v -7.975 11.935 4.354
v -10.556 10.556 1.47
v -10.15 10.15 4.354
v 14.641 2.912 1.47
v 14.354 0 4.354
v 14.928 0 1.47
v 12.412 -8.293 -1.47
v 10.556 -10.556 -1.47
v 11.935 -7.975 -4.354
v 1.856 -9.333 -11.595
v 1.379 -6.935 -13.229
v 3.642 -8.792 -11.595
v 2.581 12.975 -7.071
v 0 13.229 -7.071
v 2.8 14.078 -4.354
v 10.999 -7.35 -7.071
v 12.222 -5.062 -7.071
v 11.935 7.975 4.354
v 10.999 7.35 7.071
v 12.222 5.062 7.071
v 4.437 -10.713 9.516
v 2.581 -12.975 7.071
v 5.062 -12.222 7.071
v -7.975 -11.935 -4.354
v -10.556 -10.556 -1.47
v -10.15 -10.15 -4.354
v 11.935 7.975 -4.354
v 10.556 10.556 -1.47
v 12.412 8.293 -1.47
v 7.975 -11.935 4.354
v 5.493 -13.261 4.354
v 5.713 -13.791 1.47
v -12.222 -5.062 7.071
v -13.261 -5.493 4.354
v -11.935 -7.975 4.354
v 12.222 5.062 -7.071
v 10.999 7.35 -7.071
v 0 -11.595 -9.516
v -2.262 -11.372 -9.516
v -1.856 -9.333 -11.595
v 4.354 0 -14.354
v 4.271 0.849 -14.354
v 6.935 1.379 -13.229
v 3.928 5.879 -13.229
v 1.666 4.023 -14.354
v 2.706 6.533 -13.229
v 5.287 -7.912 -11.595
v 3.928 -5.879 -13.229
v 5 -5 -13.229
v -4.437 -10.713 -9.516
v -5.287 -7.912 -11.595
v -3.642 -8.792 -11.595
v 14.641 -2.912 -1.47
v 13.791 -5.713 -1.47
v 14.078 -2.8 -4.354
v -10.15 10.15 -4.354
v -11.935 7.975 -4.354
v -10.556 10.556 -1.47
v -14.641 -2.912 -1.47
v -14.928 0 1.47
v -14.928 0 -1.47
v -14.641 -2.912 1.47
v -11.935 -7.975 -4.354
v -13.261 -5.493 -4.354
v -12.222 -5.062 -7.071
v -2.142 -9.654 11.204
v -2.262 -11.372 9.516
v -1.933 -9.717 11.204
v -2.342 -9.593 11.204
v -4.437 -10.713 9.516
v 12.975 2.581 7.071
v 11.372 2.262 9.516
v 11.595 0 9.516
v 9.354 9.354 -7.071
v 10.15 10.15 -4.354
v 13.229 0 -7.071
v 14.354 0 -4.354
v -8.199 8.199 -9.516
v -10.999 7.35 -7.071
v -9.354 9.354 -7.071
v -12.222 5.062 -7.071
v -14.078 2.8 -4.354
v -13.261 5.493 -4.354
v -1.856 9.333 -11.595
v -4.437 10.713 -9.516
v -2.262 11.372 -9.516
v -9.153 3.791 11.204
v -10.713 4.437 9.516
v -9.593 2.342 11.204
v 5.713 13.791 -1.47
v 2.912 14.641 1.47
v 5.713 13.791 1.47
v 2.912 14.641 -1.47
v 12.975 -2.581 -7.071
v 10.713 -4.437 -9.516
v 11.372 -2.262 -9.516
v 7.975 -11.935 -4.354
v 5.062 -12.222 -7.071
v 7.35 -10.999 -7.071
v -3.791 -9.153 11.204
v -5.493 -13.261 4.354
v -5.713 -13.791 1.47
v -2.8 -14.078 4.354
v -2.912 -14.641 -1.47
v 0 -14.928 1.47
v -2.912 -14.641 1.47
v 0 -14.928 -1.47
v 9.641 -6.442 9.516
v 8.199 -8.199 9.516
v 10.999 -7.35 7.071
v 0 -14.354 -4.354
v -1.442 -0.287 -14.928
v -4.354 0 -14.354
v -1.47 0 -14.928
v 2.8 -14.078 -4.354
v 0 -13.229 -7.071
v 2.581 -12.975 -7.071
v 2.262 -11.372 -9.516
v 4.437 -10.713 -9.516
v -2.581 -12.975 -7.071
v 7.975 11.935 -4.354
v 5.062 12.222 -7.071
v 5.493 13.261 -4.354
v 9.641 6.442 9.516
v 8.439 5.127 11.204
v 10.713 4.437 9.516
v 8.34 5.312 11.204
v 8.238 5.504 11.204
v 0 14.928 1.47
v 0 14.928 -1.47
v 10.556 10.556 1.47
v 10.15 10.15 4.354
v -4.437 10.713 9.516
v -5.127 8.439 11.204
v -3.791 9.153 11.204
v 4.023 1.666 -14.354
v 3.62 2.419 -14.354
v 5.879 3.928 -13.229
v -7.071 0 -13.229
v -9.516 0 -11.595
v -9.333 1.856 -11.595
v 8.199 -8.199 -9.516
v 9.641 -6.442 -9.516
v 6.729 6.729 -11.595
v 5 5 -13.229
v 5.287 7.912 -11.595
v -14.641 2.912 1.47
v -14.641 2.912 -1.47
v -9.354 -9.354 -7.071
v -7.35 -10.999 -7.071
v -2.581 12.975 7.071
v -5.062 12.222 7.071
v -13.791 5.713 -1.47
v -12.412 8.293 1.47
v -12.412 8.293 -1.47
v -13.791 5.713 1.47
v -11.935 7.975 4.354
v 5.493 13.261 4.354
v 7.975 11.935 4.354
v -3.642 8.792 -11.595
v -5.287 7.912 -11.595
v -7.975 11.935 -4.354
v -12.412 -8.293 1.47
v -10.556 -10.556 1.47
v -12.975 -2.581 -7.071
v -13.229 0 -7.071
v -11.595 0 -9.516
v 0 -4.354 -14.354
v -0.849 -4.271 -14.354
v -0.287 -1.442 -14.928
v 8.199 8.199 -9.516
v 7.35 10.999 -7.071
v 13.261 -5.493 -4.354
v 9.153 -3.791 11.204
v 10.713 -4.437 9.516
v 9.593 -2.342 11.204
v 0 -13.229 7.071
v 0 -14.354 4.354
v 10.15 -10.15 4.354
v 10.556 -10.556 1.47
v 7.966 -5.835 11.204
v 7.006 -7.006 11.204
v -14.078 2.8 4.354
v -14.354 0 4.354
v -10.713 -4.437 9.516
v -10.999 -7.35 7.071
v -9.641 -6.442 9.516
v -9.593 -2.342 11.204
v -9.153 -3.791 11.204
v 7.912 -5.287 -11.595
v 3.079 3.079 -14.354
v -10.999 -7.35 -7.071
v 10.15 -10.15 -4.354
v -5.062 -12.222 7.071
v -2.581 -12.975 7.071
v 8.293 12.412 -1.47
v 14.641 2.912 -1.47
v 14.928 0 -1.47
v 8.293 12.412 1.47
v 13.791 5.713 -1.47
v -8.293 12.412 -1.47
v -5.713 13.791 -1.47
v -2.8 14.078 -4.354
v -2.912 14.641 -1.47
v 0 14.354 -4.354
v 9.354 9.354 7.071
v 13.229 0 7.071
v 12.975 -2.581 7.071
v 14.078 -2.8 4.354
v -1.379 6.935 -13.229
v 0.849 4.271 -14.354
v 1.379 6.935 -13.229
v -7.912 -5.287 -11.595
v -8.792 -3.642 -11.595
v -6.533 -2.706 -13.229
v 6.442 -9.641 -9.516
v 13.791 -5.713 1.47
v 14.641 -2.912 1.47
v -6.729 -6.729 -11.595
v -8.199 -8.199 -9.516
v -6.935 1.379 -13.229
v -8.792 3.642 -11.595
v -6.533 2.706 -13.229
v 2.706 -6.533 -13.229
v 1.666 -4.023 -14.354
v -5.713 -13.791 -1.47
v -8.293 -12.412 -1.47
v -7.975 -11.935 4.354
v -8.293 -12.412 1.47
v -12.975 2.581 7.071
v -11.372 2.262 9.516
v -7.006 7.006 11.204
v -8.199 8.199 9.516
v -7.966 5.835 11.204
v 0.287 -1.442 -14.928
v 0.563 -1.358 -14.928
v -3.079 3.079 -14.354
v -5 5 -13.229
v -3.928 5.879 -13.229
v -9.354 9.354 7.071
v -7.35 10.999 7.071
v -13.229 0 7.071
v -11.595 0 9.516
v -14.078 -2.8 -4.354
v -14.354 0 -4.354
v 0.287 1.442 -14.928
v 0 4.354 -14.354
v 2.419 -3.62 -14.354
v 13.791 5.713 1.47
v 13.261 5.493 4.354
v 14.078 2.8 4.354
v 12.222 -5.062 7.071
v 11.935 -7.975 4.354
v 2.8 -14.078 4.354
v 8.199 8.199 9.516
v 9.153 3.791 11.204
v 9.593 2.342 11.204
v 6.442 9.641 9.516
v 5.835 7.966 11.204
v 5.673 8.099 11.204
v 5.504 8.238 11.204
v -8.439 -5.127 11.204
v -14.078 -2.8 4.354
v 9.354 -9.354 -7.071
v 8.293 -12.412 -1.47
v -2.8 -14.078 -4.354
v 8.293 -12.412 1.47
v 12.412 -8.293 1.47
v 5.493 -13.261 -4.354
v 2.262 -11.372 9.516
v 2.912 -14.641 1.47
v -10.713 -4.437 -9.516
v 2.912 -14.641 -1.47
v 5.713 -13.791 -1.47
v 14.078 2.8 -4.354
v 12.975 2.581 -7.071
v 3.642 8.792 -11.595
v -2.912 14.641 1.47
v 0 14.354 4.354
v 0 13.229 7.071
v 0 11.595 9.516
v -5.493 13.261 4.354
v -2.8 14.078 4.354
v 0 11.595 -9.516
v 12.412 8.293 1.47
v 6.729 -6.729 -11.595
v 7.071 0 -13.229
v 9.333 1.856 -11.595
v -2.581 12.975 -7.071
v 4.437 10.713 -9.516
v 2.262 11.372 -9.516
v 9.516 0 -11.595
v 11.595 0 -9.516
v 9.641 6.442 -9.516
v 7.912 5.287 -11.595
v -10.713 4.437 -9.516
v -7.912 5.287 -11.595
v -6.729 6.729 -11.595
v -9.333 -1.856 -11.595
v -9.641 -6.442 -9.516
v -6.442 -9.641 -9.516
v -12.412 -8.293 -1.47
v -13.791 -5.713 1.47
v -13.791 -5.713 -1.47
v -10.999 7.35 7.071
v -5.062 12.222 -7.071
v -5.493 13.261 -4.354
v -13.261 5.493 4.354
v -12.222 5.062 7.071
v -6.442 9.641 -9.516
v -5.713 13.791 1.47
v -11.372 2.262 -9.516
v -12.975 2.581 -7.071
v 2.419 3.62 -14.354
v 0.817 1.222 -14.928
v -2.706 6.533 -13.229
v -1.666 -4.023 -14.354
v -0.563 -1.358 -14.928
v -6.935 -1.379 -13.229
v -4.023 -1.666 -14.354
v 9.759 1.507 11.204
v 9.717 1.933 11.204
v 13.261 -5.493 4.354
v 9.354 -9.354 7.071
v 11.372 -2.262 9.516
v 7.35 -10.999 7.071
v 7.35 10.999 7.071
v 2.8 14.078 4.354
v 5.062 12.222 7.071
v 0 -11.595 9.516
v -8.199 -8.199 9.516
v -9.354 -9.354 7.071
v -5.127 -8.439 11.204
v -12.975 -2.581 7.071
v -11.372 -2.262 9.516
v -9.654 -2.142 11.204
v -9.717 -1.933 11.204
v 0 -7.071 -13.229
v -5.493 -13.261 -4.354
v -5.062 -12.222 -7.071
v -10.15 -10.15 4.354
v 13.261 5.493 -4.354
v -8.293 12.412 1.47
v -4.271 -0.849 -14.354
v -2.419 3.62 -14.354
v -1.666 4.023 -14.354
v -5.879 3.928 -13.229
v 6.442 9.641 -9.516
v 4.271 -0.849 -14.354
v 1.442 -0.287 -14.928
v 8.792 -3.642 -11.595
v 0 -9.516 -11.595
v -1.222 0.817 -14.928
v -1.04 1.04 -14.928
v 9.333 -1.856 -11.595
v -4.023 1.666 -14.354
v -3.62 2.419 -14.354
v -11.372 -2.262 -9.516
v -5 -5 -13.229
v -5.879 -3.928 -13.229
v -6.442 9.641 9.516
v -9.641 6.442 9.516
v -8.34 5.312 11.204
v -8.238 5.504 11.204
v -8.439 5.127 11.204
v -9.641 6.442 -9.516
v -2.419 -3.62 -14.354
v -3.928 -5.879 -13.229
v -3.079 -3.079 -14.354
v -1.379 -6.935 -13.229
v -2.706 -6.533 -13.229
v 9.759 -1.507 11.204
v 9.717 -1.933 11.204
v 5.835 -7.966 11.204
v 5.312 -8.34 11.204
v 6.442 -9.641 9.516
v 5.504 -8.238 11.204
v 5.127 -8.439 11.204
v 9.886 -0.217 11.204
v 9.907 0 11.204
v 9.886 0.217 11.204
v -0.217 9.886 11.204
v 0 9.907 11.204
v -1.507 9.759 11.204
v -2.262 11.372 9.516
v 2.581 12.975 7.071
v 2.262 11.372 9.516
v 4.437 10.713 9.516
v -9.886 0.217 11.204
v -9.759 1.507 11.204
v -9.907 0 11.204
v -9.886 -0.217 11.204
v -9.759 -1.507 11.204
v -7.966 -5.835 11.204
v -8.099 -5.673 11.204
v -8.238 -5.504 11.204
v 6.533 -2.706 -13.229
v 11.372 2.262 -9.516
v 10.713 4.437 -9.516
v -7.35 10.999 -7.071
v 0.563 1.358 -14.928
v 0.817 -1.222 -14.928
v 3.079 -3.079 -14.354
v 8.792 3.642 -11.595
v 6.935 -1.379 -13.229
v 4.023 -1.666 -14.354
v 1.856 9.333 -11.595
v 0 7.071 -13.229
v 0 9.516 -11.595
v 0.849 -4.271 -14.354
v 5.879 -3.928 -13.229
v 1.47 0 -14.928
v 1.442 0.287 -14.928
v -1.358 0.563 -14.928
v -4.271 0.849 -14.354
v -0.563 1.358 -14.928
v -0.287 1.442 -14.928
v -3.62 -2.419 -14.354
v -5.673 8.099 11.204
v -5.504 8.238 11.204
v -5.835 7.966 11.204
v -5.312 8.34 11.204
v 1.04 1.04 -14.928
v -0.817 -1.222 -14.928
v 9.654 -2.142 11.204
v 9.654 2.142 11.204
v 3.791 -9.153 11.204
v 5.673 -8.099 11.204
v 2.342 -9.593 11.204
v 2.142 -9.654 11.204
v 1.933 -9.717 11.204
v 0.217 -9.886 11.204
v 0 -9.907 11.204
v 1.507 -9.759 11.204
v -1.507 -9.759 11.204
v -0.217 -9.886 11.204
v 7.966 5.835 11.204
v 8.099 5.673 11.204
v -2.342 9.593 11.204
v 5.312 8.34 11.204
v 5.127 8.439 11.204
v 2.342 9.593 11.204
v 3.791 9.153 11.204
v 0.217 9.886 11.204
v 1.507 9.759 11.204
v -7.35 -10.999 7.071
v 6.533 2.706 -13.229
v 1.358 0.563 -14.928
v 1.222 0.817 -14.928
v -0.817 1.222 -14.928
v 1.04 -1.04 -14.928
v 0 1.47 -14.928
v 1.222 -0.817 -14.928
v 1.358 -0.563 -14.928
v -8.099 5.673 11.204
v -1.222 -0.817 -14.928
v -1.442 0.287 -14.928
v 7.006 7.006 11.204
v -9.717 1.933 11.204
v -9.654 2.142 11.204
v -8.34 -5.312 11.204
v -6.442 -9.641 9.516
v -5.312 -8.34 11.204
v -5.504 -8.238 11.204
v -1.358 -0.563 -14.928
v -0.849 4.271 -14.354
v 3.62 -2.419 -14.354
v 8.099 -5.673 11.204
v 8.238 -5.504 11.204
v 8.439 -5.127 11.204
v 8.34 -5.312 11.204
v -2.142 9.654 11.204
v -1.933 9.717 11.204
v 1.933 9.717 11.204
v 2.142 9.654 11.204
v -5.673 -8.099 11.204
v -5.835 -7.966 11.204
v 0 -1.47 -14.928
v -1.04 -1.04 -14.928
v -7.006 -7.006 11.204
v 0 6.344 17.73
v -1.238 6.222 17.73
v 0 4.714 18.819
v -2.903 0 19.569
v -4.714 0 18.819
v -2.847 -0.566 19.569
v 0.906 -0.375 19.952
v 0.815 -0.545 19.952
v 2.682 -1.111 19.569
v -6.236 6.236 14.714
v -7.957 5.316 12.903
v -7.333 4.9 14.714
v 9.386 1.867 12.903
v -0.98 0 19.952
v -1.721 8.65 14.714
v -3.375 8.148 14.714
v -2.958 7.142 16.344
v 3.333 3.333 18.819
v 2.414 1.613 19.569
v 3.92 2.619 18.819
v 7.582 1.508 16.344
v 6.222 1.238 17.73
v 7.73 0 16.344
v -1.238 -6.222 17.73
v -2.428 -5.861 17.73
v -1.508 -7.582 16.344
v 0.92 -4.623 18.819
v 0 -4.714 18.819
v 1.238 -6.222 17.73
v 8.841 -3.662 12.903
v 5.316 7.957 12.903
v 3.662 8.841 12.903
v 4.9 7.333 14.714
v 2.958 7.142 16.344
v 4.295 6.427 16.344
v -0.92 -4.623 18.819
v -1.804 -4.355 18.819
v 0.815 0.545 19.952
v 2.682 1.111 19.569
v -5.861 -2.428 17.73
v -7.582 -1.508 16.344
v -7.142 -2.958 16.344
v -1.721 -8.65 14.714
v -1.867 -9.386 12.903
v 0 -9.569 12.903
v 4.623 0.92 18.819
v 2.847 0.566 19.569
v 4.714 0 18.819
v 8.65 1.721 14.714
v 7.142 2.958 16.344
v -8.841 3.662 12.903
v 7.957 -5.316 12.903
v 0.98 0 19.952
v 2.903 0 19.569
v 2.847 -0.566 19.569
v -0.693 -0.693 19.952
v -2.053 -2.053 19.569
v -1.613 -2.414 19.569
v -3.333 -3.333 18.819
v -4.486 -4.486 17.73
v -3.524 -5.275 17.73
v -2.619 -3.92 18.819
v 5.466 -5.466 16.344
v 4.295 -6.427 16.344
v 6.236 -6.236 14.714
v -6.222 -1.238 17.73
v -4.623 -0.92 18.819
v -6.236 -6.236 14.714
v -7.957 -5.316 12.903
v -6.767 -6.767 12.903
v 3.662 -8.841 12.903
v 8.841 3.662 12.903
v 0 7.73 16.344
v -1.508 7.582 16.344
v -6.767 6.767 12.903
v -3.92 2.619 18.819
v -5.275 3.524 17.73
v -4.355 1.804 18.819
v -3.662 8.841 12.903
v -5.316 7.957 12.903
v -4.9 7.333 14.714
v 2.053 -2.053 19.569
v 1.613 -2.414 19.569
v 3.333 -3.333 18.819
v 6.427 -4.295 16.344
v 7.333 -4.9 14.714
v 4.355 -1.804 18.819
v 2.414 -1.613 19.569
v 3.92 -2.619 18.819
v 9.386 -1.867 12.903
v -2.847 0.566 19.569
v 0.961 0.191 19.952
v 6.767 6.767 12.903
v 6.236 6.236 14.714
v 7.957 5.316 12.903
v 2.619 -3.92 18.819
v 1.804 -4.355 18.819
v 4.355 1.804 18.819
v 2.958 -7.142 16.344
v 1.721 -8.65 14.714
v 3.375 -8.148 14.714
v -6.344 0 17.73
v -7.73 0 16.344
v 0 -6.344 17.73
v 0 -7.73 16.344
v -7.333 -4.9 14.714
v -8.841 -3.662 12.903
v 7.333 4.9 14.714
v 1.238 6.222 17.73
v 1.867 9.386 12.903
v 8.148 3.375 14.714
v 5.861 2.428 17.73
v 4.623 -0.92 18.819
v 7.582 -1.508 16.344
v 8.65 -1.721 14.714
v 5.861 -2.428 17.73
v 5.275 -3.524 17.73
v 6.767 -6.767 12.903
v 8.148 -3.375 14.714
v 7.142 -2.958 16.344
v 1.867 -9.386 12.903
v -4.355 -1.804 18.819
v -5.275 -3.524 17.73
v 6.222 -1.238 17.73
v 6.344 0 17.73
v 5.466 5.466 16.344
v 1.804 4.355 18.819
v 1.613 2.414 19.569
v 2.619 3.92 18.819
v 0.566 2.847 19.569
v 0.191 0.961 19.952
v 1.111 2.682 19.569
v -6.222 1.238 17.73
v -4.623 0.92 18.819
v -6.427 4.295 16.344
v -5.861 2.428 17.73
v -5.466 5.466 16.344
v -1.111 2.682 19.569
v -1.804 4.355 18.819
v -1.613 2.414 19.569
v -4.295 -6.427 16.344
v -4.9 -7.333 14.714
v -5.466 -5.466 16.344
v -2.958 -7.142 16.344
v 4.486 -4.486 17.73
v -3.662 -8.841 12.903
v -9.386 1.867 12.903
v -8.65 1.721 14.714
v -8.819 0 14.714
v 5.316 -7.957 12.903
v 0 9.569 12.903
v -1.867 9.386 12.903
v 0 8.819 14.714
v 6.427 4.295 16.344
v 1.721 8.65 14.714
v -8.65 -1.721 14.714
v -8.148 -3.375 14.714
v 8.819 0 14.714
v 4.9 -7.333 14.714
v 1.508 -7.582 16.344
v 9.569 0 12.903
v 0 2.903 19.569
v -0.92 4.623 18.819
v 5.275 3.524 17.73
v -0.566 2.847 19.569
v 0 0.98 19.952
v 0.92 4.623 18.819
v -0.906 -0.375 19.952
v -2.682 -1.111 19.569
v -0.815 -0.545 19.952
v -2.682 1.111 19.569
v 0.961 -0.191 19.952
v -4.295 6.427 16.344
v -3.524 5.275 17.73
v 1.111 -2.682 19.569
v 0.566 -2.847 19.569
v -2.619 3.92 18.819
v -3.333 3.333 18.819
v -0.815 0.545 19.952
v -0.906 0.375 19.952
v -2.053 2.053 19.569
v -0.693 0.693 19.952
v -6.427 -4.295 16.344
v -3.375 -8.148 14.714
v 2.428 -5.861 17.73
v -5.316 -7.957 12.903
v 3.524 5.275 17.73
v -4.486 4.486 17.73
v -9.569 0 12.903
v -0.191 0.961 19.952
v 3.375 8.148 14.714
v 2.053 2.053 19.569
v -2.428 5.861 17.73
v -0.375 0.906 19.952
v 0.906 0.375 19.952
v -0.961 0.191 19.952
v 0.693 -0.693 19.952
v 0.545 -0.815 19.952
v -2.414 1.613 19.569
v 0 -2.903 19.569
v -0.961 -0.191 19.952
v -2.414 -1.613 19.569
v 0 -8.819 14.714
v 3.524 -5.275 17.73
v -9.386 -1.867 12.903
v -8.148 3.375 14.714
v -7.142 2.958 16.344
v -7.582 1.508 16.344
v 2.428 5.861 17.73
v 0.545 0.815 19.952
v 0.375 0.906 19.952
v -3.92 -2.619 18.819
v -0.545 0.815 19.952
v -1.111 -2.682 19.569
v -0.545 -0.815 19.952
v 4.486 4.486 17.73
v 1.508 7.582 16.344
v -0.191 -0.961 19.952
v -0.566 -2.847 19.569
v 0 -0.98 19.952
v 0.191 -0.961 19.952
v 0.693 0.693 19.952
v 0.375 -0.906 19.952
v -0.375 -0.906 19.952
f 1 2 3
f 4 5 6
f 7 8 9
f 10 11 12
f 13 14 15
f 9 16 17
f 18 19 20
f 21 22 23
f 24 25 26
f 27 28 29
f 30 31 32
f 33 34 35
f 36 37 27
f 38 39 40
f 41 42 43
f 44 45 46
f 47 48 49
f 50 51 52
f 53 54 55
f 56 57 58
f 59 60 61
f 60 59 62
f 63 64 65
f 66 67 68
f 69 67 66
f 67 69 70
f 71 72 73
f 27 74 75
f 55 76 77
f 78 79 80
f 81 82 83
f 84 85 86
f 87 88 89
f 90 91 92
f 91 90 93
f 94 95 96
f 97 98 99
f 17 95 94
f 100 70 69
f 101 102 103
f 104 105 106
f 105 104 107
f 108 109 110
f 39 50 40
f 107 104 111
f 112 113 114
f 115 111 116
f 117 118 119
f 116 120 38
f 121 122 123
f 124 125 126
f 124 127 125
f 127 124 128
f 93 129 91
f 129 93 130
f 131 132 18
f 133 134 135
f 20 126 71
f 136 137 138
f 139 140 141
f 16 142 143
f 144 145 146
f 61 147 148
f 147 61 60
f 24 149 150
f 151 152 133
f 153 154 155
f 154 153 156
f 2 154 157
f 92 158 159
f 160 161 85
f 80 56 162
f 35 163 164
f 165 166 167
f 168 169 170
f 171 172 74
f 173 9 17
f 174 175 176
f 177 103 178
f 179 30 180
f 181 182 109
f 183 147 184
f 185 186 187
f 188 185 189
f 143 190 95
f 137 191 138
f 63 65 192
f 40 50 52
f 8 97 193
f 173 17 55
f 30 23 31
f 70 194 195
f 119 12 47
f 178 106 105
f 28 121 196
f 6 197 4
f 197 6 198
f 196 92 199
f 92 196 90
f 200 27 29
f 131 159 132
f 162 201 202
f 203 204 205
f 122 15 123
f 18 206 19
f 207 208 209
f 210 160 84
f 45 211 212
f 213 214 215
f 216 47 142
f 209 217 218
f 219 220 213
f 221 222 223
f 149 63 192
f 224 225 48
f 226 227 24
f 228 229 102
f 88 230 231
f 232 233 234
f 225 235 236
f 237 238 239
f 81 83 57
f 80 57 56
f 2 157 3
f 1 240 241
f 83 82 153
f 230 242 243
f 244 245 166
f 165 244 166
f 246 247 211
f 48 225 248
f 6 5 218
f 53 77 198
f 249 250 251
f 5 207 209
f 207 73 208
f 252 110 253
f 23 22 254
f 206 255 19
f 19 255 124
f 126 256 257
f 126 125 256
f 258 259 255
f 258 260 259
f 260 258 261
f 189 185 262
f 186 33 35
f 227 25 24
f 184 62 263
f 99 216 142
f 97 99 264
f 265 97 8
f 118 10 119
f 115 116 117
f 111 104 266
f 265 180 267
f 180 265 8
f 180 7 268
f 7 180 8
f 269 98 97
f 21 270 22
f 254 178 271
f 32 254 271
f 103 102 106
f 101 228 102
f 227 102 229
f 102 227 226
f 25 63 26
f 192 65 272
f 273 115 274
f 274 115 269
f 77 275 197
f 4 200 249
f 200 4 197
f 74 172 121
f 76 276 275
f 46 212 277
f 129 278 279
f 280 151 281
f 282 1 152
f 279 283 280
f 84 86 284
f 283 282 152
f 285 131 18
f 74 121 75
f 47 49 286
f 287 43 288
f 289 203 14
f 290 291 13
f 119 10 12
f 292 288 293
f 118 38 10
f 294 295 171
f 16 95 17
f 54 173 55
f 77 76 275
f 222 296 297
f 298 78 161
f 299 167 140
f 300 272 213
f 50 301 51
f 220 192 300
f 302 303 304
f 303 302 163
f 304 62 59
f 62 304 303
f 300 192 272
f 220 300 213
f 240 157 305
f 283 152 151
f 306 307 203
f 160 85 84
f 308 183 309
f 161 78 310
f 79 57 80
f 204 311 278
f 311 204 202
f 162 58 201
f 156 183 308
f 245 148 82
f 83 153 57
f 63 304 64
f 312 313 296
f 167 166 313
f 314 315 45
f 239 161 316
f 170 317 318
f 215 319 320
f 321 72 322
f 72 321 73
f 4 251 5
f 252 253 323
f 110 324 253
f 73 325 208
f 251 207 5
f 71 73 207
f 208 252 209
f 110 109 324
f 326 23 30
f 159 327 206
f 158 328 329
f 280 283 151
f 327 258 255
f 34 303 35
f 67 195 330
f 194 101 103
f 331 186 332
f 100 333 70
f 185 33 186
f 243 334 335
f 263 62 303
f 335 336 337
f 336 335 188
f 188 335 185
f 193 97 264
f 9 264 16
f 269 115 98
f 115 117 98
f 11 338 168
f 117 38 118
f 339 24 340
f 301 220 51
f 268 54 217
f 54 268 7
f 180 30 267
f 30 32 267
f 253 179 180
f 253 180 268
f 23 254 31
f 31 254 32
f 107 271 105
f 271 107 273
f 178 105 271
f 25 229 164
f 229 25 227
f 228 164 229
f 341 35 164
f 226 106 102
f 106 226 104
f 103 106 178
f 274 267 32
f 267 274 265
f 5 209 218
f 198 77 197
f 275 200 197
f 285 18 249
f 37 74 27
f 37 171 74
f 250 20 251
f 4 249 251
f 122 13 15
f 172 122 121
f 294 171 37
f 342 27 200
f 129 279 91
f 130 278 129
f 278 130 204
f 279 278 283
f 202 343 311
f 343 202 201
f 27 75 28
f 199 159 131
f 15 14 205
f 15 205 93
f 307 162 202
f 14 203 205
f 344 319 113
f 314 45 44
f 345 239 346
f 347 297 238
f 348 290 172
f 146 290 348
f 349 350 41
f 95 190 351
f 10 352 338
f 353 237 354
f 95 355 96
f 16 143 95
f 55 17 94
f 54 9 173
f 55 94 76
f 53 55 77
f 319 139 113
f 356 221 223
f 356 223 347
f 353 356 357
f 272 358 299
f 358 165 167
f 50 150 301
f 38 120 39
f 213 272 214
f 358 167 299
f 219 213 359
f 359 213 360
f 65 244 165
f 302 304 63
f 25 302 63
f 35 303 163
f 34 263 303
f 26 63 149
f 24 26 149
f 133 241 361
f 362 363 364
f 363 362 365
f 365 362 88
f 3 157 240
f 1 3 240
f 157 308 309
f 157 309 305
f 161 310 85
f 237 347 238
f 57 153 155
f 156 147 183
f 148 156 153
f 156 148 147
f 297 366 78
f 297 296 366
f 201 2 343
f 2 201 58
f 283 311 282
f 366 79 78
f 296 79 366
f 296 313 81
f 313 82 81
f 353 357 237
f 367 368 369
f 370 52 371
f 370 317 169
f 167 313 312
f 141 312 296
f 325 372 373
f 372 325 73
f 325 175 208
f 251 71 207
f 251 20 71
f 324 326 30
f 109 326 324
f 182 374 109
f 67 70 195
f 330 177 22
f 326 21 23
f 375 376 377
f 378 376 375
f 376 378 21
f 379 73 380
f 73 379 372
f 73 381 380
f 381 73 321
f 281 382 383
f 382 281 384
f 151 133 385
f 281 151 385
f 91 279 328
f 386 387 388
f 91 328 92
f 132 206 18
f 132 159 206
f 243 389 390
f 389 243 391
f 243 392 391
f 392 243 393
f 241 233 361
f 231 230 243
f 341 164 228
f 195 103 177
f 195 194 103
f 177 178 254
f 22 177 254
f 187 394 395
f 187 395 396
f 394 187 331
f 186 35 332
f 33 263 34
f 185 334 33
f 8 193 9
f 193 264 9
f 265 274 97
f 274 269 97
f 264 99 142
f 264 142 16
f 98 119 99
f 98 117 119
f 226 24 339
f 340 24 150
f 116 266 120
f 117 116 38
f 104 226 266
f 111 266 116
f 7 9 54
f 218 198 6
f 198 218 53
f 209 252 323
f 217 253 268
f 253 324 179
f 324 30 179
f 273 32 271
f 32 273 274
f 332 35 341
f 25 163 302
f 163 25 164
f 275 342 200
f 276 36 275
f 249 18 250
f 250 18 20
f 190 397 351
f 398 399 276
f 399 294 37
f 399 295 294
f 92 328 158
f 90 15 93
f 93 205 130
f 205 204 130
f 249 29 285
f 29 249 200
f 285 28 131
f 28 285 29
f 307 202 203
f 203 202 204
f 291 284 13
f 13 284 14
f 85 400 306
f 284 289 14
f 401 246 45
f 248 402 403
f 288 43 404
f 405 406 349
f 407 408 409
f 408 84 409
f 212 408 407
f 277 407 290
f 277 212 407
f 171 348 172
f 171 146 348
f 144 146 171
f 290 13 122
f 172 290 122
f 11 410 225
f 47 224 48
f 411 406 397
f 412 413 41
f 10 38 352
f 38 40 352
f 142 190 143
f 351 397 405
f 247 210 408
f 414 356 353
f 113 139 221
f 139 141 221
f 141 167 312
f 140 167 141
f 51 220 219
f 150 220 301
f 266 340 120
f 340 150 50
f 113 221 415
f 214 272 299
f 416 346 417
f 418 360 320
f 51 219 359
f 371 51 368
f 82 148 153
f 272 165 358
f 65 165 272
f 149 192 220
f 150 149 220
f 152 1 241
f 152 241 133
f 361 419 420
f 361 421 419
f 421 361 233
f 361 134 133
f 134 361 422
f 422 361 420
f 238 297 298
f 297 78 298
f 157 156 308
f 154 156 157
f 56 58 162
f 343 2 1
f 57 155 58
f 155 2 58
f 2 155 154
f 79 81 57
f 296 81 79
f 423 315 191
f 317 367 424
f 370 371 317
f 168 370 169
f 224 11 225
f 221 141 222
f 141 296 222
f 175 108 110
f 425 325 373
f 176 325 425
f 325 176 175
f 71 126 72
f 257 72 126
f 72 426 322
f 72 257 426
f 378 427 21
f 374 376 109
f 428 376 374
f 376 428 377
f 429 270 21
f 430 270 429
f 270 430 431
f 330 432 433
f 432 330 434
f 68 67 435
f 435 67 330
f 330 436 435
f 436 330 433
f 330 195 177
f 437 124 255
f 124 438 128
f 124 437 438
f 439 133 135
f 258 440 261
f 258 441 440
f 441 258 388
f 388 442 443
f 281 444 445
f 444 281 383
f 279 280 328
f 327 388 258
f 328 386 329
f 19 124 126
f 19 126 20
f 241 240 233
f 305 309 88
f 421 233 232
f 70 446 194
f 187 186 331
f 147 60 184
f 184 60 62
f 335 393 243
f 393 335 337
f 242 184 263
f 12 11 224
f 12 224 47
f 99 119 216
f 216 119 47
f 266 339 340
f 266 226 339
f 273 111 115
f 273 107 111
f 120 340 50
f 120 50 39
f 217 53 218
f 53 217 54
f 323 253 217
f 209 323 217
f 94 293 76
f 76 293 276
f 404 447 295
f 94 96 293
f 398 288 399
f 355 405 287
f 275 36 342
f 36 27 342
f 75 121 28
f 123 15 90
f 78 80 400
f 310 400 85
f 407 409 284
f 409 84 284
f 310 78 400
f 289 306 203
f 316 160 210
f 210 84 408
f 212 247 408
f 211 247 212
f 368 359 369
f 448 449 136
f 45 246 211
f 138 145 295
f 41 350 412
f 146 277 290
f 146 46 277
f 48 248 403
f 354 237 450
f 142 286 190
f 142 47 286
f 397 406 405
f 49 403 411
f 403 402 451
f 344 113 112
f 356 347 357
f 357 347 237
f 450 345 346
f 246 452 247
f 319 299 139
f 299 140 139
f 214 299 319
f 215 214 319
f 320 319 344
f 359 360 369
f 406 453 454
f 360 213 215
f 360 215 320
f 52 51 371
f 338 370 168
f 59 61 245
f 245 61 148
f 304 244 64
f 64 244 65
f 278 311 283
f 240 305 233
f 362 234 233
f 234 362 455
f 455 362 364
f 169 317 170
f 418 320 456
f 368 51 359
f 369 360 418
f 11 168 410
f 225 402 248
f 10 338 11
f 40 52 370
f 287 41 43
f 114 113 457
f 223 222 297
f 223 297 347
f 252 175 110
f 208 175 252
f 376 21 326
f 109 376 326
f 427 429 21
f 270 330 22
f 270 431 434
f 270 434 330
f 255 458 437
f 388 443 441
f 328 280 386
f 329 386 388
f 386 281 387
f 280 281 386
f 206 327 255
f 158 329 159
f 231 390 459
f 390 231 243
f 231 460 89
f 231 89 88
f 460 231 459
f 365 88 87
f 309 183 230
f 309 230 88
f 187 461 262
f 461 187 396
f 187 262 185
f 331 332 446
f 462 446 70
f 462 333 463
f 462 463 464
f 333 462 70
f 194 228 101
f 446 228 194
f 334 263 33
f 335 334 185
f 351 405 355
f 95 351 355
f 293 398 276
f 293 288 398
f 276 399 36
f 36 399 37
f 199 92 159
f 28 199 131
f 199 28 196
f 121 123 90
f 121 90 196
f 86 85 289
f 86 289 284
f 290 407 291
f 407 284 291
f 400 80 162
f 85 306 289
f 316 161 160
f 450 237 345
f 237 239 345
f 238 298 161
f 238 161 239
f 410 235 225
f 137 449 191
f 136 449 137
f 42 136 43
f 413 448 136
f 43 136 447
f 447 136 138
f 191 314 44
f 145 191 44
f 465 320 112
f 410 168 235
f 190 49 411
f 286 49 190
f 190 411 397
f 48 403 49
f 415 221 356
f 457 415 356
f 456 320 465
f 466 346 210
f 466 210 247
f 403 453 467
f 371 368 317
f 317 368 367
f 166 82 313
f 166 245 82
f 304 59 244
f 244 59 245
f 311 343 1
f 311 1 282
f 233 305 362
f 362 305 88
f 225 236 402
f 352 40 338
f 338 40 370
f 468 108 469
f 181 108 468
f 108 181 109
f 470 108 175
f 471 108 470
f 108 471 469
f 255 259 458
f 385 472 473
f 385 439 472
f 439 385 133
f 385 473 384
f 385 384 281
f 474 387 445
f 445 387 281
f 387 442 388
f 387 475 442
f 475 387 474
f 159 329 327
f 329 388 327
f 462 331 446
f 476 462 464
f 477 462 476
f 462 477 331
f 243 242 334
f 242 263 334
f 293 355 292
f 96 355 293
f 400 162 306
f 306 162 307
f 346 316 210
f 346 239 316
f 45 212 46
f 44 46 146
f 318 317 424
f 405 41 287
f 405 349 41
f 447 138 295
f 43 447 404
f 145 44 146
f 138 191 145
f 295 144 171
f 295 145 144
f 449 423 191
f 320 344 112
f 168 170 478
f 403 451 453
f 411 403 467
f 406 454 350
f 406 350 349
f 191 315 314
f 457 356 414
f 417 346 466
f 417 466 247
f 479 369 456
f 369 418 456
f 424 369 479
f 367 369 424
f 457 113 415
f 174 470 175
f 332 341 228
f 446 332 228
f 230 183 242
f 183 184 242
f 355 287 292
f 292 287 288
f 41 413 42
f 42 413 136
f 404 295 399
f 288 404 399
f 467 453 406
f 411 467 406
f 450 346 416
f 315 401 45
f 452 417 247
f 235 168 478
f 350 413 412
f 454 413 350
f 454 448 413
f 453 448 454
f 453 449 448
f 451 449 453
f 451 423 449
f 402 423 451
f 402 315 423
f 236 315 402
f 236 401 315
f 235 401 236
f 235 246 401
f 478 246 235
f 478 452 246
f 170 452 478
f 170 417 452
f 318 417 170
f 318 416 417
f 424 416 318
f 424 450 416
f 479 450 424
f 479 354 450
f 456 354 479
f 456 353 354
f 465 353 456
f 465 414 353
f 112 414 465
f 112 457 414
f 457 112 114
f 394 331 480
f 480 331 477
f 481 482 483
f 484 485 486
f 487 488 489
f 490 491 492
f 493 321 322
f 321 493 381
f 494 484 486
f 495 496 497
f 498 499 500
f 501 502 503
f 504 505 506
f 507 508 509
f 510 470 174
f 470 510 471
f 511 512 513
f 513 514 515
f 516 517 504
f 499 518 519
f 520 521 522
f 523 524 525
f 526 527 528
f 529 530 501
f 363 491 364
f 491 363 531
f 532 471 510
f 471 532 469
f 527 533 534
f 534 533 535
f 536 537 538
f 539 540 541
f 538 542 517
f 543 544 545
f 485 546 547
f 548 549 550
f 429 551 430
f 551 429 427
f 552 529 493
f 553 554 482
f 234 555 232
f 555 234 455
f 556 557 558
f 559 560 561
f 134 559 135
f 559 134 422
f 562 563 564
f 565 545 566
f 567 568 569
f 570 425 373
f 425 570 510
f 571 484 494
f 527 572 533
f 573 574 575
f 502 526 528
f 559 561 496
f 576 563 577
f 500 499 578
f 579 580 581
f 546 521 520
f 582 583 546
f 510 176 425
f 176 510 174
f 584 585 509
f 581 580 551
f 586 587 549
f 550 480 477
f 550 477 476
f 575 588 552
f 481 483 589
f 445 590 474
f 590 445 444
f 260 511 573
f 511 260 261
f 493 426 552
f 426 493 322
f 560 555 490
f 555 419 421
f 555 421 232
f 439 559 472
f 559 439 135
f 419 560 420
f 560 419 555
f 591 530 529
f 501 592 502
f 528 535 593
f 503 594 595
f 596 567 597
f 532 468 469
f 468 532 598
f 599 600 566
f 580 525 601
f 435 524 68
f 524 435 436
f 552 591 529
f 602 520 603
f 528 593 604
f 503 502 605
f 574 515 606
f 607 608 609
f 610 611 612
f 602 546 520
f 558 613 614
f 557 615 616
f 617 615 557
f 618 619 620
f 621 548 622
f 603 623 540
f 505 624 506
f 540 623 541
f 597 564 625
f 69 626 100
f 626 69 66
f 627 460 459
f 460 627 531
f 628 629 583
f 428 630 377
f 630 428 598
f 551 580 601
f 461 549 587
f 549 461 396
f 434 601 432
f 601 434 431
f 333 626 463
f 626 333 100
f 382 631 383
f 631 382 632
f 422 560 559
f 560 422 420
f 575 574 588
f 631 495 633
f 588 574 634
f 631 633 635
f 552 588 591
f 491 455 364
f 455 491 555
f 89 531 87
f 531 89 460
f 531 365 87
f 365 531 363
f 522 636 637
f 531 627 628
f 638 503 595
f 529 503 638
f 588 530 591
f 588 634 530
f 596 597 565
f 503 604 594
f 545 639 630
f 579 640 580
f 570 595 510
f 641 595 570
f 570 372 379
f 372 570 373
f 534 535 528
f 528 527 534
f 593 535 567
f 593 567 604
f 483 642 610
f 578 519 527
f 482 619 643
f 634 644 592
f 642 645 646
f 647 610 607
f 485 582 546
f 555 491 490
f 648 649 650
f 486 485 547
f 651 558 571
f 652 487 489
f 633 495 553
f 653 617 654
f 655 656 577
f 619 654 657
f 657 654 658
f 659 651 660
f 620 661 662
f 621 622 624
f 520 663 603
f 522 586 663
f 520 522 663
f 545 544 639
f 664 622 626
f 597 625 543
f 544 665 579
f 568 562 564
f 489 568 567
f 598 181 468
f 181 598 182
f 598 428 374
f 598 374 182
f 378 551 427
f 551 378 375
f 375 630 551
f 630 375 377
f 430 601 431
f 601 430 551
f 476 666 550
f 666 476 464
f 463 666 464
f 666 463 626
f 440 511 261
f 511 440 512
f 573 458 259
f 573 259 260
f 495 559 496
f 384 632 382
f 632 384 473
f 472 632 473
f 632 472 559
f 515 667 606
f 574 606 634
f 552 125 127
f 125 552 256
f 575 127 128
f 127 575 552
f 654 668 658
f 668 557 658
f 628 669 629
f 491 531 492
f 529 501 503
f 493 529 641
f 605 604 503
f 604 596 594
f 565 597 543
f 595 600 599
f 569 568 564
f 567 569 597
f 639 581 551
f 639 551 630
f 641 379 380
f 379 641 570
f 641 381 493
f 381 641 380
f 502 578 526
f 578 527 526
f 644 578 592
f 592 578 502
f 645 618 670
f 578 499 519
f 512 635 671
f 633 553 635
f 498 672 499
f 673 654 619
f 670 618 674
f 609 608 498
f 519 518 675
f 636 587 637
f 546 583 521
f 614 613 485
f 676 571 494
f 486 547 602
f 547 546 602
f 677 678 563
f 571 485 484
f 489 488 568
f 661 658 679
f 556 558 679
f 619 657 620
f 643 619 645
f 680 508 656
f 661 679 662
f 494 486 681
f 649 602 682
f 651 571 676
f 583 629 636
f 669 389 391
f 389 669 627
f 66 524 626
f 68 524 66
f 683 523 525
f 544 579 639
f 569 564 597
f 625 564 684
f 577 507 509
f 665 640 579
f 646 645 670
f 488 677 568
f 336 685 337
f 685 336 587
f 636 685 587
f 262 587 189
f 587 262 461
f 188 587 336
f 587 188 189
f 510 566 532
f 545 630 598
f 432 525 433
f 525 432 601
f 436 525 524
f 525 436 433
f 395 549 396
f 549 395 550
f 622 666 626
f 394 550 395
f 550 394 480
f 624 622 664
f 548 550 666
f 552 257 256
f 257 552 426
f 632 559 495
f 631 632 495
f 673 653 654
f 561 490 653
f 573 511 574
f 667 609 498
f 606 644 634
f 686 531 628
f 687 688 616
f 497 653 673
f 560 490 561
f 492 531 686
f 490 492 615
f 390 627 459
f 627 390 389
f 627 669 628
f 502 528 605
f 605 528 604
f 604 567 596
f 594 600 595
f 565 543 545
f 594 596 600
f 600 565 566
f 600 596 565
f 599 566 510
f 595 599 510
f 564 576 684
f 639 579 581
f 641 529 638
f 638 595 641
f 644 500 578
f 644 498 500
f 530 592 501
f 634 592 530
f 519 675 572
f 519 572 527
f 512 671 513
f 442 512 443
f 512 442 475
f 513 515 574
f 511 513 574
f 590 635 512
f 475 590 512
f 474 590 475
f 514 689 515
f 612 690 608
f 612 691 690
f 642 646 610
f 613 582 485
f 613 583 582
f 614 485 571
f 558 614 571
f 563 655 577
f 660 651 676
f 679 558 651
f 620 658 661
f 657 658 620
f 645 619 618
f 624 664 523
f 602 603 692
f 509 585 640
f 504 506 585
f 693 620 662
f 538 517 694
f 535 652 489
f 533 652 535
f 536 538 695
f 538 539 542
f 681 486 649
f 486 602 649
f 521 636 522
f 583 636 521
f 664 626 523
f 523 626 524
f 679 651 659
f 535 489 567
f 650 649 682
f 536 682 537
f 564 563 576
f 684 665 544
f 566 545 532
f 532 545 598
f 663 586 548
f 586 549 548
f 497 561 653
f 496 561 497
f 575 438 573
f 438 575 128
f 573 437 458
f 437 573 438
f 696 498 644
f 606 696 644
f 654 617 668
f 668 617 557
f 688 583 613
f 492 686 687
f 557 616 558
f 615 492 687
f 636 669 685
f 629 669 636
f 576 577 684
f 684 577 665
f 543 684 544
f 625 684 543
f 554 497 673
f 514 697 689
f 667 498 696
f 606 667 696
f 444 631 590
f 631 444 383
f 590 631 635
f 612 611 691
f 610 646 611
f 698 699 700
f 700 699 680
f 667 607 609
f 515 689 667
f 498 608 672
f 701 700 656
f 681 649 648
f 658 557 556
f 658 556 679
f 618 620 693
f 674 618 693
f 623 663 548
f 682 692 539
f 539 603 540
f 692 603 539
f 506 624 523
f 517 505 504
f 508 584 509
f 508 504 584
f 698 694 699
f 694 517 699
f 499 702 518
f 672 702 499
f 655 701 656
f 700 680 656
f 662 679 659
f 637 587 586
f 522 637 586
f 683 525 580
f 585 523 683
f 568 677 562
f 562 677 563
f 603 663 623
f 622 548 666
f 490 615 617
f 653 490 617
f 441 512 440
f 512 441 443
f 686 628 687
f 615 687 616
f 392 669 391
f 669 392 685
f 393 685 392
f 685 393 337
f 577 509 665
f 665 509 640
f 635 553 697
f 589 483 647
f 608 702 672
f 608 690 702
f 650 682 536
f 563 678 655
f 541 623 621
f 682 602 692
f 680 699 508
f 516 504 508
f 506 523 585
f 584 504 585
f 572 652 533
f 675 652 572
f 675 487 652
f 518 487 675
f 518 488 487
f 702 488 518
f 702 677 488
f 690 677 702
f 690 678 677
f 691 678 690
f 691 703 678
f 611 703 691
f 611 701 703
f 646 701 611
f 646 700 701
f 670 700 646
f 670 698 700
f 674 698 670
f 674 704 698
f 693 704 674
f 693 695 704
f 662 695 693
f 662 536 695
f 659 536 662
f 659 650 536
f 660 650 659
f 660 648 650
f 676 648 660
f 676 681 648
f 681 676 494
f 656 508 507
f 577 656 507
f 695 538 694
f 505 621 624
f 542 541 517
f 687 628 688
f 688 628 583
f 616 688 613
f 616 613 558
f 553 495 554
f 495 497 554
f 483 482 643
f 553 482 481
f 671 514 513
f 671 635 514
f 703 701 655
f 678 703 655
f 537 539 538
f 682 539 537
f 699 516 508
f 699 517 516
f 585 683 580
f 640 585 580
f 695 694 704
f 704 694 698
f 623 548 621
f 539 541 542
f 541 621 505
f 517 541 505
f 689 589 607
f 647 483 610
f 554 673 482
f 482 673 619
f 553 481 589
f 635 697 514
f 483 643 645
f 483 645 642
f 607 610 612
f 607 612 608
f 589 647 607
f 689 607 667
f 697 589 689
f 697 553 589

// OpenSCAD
union(){
   sphere( r=15.000000, $fn=32 );translate( [ 0.000000, 0.000000, 10.000000 ] )
      sphere( r=10.000000, $fn=32 );
}
